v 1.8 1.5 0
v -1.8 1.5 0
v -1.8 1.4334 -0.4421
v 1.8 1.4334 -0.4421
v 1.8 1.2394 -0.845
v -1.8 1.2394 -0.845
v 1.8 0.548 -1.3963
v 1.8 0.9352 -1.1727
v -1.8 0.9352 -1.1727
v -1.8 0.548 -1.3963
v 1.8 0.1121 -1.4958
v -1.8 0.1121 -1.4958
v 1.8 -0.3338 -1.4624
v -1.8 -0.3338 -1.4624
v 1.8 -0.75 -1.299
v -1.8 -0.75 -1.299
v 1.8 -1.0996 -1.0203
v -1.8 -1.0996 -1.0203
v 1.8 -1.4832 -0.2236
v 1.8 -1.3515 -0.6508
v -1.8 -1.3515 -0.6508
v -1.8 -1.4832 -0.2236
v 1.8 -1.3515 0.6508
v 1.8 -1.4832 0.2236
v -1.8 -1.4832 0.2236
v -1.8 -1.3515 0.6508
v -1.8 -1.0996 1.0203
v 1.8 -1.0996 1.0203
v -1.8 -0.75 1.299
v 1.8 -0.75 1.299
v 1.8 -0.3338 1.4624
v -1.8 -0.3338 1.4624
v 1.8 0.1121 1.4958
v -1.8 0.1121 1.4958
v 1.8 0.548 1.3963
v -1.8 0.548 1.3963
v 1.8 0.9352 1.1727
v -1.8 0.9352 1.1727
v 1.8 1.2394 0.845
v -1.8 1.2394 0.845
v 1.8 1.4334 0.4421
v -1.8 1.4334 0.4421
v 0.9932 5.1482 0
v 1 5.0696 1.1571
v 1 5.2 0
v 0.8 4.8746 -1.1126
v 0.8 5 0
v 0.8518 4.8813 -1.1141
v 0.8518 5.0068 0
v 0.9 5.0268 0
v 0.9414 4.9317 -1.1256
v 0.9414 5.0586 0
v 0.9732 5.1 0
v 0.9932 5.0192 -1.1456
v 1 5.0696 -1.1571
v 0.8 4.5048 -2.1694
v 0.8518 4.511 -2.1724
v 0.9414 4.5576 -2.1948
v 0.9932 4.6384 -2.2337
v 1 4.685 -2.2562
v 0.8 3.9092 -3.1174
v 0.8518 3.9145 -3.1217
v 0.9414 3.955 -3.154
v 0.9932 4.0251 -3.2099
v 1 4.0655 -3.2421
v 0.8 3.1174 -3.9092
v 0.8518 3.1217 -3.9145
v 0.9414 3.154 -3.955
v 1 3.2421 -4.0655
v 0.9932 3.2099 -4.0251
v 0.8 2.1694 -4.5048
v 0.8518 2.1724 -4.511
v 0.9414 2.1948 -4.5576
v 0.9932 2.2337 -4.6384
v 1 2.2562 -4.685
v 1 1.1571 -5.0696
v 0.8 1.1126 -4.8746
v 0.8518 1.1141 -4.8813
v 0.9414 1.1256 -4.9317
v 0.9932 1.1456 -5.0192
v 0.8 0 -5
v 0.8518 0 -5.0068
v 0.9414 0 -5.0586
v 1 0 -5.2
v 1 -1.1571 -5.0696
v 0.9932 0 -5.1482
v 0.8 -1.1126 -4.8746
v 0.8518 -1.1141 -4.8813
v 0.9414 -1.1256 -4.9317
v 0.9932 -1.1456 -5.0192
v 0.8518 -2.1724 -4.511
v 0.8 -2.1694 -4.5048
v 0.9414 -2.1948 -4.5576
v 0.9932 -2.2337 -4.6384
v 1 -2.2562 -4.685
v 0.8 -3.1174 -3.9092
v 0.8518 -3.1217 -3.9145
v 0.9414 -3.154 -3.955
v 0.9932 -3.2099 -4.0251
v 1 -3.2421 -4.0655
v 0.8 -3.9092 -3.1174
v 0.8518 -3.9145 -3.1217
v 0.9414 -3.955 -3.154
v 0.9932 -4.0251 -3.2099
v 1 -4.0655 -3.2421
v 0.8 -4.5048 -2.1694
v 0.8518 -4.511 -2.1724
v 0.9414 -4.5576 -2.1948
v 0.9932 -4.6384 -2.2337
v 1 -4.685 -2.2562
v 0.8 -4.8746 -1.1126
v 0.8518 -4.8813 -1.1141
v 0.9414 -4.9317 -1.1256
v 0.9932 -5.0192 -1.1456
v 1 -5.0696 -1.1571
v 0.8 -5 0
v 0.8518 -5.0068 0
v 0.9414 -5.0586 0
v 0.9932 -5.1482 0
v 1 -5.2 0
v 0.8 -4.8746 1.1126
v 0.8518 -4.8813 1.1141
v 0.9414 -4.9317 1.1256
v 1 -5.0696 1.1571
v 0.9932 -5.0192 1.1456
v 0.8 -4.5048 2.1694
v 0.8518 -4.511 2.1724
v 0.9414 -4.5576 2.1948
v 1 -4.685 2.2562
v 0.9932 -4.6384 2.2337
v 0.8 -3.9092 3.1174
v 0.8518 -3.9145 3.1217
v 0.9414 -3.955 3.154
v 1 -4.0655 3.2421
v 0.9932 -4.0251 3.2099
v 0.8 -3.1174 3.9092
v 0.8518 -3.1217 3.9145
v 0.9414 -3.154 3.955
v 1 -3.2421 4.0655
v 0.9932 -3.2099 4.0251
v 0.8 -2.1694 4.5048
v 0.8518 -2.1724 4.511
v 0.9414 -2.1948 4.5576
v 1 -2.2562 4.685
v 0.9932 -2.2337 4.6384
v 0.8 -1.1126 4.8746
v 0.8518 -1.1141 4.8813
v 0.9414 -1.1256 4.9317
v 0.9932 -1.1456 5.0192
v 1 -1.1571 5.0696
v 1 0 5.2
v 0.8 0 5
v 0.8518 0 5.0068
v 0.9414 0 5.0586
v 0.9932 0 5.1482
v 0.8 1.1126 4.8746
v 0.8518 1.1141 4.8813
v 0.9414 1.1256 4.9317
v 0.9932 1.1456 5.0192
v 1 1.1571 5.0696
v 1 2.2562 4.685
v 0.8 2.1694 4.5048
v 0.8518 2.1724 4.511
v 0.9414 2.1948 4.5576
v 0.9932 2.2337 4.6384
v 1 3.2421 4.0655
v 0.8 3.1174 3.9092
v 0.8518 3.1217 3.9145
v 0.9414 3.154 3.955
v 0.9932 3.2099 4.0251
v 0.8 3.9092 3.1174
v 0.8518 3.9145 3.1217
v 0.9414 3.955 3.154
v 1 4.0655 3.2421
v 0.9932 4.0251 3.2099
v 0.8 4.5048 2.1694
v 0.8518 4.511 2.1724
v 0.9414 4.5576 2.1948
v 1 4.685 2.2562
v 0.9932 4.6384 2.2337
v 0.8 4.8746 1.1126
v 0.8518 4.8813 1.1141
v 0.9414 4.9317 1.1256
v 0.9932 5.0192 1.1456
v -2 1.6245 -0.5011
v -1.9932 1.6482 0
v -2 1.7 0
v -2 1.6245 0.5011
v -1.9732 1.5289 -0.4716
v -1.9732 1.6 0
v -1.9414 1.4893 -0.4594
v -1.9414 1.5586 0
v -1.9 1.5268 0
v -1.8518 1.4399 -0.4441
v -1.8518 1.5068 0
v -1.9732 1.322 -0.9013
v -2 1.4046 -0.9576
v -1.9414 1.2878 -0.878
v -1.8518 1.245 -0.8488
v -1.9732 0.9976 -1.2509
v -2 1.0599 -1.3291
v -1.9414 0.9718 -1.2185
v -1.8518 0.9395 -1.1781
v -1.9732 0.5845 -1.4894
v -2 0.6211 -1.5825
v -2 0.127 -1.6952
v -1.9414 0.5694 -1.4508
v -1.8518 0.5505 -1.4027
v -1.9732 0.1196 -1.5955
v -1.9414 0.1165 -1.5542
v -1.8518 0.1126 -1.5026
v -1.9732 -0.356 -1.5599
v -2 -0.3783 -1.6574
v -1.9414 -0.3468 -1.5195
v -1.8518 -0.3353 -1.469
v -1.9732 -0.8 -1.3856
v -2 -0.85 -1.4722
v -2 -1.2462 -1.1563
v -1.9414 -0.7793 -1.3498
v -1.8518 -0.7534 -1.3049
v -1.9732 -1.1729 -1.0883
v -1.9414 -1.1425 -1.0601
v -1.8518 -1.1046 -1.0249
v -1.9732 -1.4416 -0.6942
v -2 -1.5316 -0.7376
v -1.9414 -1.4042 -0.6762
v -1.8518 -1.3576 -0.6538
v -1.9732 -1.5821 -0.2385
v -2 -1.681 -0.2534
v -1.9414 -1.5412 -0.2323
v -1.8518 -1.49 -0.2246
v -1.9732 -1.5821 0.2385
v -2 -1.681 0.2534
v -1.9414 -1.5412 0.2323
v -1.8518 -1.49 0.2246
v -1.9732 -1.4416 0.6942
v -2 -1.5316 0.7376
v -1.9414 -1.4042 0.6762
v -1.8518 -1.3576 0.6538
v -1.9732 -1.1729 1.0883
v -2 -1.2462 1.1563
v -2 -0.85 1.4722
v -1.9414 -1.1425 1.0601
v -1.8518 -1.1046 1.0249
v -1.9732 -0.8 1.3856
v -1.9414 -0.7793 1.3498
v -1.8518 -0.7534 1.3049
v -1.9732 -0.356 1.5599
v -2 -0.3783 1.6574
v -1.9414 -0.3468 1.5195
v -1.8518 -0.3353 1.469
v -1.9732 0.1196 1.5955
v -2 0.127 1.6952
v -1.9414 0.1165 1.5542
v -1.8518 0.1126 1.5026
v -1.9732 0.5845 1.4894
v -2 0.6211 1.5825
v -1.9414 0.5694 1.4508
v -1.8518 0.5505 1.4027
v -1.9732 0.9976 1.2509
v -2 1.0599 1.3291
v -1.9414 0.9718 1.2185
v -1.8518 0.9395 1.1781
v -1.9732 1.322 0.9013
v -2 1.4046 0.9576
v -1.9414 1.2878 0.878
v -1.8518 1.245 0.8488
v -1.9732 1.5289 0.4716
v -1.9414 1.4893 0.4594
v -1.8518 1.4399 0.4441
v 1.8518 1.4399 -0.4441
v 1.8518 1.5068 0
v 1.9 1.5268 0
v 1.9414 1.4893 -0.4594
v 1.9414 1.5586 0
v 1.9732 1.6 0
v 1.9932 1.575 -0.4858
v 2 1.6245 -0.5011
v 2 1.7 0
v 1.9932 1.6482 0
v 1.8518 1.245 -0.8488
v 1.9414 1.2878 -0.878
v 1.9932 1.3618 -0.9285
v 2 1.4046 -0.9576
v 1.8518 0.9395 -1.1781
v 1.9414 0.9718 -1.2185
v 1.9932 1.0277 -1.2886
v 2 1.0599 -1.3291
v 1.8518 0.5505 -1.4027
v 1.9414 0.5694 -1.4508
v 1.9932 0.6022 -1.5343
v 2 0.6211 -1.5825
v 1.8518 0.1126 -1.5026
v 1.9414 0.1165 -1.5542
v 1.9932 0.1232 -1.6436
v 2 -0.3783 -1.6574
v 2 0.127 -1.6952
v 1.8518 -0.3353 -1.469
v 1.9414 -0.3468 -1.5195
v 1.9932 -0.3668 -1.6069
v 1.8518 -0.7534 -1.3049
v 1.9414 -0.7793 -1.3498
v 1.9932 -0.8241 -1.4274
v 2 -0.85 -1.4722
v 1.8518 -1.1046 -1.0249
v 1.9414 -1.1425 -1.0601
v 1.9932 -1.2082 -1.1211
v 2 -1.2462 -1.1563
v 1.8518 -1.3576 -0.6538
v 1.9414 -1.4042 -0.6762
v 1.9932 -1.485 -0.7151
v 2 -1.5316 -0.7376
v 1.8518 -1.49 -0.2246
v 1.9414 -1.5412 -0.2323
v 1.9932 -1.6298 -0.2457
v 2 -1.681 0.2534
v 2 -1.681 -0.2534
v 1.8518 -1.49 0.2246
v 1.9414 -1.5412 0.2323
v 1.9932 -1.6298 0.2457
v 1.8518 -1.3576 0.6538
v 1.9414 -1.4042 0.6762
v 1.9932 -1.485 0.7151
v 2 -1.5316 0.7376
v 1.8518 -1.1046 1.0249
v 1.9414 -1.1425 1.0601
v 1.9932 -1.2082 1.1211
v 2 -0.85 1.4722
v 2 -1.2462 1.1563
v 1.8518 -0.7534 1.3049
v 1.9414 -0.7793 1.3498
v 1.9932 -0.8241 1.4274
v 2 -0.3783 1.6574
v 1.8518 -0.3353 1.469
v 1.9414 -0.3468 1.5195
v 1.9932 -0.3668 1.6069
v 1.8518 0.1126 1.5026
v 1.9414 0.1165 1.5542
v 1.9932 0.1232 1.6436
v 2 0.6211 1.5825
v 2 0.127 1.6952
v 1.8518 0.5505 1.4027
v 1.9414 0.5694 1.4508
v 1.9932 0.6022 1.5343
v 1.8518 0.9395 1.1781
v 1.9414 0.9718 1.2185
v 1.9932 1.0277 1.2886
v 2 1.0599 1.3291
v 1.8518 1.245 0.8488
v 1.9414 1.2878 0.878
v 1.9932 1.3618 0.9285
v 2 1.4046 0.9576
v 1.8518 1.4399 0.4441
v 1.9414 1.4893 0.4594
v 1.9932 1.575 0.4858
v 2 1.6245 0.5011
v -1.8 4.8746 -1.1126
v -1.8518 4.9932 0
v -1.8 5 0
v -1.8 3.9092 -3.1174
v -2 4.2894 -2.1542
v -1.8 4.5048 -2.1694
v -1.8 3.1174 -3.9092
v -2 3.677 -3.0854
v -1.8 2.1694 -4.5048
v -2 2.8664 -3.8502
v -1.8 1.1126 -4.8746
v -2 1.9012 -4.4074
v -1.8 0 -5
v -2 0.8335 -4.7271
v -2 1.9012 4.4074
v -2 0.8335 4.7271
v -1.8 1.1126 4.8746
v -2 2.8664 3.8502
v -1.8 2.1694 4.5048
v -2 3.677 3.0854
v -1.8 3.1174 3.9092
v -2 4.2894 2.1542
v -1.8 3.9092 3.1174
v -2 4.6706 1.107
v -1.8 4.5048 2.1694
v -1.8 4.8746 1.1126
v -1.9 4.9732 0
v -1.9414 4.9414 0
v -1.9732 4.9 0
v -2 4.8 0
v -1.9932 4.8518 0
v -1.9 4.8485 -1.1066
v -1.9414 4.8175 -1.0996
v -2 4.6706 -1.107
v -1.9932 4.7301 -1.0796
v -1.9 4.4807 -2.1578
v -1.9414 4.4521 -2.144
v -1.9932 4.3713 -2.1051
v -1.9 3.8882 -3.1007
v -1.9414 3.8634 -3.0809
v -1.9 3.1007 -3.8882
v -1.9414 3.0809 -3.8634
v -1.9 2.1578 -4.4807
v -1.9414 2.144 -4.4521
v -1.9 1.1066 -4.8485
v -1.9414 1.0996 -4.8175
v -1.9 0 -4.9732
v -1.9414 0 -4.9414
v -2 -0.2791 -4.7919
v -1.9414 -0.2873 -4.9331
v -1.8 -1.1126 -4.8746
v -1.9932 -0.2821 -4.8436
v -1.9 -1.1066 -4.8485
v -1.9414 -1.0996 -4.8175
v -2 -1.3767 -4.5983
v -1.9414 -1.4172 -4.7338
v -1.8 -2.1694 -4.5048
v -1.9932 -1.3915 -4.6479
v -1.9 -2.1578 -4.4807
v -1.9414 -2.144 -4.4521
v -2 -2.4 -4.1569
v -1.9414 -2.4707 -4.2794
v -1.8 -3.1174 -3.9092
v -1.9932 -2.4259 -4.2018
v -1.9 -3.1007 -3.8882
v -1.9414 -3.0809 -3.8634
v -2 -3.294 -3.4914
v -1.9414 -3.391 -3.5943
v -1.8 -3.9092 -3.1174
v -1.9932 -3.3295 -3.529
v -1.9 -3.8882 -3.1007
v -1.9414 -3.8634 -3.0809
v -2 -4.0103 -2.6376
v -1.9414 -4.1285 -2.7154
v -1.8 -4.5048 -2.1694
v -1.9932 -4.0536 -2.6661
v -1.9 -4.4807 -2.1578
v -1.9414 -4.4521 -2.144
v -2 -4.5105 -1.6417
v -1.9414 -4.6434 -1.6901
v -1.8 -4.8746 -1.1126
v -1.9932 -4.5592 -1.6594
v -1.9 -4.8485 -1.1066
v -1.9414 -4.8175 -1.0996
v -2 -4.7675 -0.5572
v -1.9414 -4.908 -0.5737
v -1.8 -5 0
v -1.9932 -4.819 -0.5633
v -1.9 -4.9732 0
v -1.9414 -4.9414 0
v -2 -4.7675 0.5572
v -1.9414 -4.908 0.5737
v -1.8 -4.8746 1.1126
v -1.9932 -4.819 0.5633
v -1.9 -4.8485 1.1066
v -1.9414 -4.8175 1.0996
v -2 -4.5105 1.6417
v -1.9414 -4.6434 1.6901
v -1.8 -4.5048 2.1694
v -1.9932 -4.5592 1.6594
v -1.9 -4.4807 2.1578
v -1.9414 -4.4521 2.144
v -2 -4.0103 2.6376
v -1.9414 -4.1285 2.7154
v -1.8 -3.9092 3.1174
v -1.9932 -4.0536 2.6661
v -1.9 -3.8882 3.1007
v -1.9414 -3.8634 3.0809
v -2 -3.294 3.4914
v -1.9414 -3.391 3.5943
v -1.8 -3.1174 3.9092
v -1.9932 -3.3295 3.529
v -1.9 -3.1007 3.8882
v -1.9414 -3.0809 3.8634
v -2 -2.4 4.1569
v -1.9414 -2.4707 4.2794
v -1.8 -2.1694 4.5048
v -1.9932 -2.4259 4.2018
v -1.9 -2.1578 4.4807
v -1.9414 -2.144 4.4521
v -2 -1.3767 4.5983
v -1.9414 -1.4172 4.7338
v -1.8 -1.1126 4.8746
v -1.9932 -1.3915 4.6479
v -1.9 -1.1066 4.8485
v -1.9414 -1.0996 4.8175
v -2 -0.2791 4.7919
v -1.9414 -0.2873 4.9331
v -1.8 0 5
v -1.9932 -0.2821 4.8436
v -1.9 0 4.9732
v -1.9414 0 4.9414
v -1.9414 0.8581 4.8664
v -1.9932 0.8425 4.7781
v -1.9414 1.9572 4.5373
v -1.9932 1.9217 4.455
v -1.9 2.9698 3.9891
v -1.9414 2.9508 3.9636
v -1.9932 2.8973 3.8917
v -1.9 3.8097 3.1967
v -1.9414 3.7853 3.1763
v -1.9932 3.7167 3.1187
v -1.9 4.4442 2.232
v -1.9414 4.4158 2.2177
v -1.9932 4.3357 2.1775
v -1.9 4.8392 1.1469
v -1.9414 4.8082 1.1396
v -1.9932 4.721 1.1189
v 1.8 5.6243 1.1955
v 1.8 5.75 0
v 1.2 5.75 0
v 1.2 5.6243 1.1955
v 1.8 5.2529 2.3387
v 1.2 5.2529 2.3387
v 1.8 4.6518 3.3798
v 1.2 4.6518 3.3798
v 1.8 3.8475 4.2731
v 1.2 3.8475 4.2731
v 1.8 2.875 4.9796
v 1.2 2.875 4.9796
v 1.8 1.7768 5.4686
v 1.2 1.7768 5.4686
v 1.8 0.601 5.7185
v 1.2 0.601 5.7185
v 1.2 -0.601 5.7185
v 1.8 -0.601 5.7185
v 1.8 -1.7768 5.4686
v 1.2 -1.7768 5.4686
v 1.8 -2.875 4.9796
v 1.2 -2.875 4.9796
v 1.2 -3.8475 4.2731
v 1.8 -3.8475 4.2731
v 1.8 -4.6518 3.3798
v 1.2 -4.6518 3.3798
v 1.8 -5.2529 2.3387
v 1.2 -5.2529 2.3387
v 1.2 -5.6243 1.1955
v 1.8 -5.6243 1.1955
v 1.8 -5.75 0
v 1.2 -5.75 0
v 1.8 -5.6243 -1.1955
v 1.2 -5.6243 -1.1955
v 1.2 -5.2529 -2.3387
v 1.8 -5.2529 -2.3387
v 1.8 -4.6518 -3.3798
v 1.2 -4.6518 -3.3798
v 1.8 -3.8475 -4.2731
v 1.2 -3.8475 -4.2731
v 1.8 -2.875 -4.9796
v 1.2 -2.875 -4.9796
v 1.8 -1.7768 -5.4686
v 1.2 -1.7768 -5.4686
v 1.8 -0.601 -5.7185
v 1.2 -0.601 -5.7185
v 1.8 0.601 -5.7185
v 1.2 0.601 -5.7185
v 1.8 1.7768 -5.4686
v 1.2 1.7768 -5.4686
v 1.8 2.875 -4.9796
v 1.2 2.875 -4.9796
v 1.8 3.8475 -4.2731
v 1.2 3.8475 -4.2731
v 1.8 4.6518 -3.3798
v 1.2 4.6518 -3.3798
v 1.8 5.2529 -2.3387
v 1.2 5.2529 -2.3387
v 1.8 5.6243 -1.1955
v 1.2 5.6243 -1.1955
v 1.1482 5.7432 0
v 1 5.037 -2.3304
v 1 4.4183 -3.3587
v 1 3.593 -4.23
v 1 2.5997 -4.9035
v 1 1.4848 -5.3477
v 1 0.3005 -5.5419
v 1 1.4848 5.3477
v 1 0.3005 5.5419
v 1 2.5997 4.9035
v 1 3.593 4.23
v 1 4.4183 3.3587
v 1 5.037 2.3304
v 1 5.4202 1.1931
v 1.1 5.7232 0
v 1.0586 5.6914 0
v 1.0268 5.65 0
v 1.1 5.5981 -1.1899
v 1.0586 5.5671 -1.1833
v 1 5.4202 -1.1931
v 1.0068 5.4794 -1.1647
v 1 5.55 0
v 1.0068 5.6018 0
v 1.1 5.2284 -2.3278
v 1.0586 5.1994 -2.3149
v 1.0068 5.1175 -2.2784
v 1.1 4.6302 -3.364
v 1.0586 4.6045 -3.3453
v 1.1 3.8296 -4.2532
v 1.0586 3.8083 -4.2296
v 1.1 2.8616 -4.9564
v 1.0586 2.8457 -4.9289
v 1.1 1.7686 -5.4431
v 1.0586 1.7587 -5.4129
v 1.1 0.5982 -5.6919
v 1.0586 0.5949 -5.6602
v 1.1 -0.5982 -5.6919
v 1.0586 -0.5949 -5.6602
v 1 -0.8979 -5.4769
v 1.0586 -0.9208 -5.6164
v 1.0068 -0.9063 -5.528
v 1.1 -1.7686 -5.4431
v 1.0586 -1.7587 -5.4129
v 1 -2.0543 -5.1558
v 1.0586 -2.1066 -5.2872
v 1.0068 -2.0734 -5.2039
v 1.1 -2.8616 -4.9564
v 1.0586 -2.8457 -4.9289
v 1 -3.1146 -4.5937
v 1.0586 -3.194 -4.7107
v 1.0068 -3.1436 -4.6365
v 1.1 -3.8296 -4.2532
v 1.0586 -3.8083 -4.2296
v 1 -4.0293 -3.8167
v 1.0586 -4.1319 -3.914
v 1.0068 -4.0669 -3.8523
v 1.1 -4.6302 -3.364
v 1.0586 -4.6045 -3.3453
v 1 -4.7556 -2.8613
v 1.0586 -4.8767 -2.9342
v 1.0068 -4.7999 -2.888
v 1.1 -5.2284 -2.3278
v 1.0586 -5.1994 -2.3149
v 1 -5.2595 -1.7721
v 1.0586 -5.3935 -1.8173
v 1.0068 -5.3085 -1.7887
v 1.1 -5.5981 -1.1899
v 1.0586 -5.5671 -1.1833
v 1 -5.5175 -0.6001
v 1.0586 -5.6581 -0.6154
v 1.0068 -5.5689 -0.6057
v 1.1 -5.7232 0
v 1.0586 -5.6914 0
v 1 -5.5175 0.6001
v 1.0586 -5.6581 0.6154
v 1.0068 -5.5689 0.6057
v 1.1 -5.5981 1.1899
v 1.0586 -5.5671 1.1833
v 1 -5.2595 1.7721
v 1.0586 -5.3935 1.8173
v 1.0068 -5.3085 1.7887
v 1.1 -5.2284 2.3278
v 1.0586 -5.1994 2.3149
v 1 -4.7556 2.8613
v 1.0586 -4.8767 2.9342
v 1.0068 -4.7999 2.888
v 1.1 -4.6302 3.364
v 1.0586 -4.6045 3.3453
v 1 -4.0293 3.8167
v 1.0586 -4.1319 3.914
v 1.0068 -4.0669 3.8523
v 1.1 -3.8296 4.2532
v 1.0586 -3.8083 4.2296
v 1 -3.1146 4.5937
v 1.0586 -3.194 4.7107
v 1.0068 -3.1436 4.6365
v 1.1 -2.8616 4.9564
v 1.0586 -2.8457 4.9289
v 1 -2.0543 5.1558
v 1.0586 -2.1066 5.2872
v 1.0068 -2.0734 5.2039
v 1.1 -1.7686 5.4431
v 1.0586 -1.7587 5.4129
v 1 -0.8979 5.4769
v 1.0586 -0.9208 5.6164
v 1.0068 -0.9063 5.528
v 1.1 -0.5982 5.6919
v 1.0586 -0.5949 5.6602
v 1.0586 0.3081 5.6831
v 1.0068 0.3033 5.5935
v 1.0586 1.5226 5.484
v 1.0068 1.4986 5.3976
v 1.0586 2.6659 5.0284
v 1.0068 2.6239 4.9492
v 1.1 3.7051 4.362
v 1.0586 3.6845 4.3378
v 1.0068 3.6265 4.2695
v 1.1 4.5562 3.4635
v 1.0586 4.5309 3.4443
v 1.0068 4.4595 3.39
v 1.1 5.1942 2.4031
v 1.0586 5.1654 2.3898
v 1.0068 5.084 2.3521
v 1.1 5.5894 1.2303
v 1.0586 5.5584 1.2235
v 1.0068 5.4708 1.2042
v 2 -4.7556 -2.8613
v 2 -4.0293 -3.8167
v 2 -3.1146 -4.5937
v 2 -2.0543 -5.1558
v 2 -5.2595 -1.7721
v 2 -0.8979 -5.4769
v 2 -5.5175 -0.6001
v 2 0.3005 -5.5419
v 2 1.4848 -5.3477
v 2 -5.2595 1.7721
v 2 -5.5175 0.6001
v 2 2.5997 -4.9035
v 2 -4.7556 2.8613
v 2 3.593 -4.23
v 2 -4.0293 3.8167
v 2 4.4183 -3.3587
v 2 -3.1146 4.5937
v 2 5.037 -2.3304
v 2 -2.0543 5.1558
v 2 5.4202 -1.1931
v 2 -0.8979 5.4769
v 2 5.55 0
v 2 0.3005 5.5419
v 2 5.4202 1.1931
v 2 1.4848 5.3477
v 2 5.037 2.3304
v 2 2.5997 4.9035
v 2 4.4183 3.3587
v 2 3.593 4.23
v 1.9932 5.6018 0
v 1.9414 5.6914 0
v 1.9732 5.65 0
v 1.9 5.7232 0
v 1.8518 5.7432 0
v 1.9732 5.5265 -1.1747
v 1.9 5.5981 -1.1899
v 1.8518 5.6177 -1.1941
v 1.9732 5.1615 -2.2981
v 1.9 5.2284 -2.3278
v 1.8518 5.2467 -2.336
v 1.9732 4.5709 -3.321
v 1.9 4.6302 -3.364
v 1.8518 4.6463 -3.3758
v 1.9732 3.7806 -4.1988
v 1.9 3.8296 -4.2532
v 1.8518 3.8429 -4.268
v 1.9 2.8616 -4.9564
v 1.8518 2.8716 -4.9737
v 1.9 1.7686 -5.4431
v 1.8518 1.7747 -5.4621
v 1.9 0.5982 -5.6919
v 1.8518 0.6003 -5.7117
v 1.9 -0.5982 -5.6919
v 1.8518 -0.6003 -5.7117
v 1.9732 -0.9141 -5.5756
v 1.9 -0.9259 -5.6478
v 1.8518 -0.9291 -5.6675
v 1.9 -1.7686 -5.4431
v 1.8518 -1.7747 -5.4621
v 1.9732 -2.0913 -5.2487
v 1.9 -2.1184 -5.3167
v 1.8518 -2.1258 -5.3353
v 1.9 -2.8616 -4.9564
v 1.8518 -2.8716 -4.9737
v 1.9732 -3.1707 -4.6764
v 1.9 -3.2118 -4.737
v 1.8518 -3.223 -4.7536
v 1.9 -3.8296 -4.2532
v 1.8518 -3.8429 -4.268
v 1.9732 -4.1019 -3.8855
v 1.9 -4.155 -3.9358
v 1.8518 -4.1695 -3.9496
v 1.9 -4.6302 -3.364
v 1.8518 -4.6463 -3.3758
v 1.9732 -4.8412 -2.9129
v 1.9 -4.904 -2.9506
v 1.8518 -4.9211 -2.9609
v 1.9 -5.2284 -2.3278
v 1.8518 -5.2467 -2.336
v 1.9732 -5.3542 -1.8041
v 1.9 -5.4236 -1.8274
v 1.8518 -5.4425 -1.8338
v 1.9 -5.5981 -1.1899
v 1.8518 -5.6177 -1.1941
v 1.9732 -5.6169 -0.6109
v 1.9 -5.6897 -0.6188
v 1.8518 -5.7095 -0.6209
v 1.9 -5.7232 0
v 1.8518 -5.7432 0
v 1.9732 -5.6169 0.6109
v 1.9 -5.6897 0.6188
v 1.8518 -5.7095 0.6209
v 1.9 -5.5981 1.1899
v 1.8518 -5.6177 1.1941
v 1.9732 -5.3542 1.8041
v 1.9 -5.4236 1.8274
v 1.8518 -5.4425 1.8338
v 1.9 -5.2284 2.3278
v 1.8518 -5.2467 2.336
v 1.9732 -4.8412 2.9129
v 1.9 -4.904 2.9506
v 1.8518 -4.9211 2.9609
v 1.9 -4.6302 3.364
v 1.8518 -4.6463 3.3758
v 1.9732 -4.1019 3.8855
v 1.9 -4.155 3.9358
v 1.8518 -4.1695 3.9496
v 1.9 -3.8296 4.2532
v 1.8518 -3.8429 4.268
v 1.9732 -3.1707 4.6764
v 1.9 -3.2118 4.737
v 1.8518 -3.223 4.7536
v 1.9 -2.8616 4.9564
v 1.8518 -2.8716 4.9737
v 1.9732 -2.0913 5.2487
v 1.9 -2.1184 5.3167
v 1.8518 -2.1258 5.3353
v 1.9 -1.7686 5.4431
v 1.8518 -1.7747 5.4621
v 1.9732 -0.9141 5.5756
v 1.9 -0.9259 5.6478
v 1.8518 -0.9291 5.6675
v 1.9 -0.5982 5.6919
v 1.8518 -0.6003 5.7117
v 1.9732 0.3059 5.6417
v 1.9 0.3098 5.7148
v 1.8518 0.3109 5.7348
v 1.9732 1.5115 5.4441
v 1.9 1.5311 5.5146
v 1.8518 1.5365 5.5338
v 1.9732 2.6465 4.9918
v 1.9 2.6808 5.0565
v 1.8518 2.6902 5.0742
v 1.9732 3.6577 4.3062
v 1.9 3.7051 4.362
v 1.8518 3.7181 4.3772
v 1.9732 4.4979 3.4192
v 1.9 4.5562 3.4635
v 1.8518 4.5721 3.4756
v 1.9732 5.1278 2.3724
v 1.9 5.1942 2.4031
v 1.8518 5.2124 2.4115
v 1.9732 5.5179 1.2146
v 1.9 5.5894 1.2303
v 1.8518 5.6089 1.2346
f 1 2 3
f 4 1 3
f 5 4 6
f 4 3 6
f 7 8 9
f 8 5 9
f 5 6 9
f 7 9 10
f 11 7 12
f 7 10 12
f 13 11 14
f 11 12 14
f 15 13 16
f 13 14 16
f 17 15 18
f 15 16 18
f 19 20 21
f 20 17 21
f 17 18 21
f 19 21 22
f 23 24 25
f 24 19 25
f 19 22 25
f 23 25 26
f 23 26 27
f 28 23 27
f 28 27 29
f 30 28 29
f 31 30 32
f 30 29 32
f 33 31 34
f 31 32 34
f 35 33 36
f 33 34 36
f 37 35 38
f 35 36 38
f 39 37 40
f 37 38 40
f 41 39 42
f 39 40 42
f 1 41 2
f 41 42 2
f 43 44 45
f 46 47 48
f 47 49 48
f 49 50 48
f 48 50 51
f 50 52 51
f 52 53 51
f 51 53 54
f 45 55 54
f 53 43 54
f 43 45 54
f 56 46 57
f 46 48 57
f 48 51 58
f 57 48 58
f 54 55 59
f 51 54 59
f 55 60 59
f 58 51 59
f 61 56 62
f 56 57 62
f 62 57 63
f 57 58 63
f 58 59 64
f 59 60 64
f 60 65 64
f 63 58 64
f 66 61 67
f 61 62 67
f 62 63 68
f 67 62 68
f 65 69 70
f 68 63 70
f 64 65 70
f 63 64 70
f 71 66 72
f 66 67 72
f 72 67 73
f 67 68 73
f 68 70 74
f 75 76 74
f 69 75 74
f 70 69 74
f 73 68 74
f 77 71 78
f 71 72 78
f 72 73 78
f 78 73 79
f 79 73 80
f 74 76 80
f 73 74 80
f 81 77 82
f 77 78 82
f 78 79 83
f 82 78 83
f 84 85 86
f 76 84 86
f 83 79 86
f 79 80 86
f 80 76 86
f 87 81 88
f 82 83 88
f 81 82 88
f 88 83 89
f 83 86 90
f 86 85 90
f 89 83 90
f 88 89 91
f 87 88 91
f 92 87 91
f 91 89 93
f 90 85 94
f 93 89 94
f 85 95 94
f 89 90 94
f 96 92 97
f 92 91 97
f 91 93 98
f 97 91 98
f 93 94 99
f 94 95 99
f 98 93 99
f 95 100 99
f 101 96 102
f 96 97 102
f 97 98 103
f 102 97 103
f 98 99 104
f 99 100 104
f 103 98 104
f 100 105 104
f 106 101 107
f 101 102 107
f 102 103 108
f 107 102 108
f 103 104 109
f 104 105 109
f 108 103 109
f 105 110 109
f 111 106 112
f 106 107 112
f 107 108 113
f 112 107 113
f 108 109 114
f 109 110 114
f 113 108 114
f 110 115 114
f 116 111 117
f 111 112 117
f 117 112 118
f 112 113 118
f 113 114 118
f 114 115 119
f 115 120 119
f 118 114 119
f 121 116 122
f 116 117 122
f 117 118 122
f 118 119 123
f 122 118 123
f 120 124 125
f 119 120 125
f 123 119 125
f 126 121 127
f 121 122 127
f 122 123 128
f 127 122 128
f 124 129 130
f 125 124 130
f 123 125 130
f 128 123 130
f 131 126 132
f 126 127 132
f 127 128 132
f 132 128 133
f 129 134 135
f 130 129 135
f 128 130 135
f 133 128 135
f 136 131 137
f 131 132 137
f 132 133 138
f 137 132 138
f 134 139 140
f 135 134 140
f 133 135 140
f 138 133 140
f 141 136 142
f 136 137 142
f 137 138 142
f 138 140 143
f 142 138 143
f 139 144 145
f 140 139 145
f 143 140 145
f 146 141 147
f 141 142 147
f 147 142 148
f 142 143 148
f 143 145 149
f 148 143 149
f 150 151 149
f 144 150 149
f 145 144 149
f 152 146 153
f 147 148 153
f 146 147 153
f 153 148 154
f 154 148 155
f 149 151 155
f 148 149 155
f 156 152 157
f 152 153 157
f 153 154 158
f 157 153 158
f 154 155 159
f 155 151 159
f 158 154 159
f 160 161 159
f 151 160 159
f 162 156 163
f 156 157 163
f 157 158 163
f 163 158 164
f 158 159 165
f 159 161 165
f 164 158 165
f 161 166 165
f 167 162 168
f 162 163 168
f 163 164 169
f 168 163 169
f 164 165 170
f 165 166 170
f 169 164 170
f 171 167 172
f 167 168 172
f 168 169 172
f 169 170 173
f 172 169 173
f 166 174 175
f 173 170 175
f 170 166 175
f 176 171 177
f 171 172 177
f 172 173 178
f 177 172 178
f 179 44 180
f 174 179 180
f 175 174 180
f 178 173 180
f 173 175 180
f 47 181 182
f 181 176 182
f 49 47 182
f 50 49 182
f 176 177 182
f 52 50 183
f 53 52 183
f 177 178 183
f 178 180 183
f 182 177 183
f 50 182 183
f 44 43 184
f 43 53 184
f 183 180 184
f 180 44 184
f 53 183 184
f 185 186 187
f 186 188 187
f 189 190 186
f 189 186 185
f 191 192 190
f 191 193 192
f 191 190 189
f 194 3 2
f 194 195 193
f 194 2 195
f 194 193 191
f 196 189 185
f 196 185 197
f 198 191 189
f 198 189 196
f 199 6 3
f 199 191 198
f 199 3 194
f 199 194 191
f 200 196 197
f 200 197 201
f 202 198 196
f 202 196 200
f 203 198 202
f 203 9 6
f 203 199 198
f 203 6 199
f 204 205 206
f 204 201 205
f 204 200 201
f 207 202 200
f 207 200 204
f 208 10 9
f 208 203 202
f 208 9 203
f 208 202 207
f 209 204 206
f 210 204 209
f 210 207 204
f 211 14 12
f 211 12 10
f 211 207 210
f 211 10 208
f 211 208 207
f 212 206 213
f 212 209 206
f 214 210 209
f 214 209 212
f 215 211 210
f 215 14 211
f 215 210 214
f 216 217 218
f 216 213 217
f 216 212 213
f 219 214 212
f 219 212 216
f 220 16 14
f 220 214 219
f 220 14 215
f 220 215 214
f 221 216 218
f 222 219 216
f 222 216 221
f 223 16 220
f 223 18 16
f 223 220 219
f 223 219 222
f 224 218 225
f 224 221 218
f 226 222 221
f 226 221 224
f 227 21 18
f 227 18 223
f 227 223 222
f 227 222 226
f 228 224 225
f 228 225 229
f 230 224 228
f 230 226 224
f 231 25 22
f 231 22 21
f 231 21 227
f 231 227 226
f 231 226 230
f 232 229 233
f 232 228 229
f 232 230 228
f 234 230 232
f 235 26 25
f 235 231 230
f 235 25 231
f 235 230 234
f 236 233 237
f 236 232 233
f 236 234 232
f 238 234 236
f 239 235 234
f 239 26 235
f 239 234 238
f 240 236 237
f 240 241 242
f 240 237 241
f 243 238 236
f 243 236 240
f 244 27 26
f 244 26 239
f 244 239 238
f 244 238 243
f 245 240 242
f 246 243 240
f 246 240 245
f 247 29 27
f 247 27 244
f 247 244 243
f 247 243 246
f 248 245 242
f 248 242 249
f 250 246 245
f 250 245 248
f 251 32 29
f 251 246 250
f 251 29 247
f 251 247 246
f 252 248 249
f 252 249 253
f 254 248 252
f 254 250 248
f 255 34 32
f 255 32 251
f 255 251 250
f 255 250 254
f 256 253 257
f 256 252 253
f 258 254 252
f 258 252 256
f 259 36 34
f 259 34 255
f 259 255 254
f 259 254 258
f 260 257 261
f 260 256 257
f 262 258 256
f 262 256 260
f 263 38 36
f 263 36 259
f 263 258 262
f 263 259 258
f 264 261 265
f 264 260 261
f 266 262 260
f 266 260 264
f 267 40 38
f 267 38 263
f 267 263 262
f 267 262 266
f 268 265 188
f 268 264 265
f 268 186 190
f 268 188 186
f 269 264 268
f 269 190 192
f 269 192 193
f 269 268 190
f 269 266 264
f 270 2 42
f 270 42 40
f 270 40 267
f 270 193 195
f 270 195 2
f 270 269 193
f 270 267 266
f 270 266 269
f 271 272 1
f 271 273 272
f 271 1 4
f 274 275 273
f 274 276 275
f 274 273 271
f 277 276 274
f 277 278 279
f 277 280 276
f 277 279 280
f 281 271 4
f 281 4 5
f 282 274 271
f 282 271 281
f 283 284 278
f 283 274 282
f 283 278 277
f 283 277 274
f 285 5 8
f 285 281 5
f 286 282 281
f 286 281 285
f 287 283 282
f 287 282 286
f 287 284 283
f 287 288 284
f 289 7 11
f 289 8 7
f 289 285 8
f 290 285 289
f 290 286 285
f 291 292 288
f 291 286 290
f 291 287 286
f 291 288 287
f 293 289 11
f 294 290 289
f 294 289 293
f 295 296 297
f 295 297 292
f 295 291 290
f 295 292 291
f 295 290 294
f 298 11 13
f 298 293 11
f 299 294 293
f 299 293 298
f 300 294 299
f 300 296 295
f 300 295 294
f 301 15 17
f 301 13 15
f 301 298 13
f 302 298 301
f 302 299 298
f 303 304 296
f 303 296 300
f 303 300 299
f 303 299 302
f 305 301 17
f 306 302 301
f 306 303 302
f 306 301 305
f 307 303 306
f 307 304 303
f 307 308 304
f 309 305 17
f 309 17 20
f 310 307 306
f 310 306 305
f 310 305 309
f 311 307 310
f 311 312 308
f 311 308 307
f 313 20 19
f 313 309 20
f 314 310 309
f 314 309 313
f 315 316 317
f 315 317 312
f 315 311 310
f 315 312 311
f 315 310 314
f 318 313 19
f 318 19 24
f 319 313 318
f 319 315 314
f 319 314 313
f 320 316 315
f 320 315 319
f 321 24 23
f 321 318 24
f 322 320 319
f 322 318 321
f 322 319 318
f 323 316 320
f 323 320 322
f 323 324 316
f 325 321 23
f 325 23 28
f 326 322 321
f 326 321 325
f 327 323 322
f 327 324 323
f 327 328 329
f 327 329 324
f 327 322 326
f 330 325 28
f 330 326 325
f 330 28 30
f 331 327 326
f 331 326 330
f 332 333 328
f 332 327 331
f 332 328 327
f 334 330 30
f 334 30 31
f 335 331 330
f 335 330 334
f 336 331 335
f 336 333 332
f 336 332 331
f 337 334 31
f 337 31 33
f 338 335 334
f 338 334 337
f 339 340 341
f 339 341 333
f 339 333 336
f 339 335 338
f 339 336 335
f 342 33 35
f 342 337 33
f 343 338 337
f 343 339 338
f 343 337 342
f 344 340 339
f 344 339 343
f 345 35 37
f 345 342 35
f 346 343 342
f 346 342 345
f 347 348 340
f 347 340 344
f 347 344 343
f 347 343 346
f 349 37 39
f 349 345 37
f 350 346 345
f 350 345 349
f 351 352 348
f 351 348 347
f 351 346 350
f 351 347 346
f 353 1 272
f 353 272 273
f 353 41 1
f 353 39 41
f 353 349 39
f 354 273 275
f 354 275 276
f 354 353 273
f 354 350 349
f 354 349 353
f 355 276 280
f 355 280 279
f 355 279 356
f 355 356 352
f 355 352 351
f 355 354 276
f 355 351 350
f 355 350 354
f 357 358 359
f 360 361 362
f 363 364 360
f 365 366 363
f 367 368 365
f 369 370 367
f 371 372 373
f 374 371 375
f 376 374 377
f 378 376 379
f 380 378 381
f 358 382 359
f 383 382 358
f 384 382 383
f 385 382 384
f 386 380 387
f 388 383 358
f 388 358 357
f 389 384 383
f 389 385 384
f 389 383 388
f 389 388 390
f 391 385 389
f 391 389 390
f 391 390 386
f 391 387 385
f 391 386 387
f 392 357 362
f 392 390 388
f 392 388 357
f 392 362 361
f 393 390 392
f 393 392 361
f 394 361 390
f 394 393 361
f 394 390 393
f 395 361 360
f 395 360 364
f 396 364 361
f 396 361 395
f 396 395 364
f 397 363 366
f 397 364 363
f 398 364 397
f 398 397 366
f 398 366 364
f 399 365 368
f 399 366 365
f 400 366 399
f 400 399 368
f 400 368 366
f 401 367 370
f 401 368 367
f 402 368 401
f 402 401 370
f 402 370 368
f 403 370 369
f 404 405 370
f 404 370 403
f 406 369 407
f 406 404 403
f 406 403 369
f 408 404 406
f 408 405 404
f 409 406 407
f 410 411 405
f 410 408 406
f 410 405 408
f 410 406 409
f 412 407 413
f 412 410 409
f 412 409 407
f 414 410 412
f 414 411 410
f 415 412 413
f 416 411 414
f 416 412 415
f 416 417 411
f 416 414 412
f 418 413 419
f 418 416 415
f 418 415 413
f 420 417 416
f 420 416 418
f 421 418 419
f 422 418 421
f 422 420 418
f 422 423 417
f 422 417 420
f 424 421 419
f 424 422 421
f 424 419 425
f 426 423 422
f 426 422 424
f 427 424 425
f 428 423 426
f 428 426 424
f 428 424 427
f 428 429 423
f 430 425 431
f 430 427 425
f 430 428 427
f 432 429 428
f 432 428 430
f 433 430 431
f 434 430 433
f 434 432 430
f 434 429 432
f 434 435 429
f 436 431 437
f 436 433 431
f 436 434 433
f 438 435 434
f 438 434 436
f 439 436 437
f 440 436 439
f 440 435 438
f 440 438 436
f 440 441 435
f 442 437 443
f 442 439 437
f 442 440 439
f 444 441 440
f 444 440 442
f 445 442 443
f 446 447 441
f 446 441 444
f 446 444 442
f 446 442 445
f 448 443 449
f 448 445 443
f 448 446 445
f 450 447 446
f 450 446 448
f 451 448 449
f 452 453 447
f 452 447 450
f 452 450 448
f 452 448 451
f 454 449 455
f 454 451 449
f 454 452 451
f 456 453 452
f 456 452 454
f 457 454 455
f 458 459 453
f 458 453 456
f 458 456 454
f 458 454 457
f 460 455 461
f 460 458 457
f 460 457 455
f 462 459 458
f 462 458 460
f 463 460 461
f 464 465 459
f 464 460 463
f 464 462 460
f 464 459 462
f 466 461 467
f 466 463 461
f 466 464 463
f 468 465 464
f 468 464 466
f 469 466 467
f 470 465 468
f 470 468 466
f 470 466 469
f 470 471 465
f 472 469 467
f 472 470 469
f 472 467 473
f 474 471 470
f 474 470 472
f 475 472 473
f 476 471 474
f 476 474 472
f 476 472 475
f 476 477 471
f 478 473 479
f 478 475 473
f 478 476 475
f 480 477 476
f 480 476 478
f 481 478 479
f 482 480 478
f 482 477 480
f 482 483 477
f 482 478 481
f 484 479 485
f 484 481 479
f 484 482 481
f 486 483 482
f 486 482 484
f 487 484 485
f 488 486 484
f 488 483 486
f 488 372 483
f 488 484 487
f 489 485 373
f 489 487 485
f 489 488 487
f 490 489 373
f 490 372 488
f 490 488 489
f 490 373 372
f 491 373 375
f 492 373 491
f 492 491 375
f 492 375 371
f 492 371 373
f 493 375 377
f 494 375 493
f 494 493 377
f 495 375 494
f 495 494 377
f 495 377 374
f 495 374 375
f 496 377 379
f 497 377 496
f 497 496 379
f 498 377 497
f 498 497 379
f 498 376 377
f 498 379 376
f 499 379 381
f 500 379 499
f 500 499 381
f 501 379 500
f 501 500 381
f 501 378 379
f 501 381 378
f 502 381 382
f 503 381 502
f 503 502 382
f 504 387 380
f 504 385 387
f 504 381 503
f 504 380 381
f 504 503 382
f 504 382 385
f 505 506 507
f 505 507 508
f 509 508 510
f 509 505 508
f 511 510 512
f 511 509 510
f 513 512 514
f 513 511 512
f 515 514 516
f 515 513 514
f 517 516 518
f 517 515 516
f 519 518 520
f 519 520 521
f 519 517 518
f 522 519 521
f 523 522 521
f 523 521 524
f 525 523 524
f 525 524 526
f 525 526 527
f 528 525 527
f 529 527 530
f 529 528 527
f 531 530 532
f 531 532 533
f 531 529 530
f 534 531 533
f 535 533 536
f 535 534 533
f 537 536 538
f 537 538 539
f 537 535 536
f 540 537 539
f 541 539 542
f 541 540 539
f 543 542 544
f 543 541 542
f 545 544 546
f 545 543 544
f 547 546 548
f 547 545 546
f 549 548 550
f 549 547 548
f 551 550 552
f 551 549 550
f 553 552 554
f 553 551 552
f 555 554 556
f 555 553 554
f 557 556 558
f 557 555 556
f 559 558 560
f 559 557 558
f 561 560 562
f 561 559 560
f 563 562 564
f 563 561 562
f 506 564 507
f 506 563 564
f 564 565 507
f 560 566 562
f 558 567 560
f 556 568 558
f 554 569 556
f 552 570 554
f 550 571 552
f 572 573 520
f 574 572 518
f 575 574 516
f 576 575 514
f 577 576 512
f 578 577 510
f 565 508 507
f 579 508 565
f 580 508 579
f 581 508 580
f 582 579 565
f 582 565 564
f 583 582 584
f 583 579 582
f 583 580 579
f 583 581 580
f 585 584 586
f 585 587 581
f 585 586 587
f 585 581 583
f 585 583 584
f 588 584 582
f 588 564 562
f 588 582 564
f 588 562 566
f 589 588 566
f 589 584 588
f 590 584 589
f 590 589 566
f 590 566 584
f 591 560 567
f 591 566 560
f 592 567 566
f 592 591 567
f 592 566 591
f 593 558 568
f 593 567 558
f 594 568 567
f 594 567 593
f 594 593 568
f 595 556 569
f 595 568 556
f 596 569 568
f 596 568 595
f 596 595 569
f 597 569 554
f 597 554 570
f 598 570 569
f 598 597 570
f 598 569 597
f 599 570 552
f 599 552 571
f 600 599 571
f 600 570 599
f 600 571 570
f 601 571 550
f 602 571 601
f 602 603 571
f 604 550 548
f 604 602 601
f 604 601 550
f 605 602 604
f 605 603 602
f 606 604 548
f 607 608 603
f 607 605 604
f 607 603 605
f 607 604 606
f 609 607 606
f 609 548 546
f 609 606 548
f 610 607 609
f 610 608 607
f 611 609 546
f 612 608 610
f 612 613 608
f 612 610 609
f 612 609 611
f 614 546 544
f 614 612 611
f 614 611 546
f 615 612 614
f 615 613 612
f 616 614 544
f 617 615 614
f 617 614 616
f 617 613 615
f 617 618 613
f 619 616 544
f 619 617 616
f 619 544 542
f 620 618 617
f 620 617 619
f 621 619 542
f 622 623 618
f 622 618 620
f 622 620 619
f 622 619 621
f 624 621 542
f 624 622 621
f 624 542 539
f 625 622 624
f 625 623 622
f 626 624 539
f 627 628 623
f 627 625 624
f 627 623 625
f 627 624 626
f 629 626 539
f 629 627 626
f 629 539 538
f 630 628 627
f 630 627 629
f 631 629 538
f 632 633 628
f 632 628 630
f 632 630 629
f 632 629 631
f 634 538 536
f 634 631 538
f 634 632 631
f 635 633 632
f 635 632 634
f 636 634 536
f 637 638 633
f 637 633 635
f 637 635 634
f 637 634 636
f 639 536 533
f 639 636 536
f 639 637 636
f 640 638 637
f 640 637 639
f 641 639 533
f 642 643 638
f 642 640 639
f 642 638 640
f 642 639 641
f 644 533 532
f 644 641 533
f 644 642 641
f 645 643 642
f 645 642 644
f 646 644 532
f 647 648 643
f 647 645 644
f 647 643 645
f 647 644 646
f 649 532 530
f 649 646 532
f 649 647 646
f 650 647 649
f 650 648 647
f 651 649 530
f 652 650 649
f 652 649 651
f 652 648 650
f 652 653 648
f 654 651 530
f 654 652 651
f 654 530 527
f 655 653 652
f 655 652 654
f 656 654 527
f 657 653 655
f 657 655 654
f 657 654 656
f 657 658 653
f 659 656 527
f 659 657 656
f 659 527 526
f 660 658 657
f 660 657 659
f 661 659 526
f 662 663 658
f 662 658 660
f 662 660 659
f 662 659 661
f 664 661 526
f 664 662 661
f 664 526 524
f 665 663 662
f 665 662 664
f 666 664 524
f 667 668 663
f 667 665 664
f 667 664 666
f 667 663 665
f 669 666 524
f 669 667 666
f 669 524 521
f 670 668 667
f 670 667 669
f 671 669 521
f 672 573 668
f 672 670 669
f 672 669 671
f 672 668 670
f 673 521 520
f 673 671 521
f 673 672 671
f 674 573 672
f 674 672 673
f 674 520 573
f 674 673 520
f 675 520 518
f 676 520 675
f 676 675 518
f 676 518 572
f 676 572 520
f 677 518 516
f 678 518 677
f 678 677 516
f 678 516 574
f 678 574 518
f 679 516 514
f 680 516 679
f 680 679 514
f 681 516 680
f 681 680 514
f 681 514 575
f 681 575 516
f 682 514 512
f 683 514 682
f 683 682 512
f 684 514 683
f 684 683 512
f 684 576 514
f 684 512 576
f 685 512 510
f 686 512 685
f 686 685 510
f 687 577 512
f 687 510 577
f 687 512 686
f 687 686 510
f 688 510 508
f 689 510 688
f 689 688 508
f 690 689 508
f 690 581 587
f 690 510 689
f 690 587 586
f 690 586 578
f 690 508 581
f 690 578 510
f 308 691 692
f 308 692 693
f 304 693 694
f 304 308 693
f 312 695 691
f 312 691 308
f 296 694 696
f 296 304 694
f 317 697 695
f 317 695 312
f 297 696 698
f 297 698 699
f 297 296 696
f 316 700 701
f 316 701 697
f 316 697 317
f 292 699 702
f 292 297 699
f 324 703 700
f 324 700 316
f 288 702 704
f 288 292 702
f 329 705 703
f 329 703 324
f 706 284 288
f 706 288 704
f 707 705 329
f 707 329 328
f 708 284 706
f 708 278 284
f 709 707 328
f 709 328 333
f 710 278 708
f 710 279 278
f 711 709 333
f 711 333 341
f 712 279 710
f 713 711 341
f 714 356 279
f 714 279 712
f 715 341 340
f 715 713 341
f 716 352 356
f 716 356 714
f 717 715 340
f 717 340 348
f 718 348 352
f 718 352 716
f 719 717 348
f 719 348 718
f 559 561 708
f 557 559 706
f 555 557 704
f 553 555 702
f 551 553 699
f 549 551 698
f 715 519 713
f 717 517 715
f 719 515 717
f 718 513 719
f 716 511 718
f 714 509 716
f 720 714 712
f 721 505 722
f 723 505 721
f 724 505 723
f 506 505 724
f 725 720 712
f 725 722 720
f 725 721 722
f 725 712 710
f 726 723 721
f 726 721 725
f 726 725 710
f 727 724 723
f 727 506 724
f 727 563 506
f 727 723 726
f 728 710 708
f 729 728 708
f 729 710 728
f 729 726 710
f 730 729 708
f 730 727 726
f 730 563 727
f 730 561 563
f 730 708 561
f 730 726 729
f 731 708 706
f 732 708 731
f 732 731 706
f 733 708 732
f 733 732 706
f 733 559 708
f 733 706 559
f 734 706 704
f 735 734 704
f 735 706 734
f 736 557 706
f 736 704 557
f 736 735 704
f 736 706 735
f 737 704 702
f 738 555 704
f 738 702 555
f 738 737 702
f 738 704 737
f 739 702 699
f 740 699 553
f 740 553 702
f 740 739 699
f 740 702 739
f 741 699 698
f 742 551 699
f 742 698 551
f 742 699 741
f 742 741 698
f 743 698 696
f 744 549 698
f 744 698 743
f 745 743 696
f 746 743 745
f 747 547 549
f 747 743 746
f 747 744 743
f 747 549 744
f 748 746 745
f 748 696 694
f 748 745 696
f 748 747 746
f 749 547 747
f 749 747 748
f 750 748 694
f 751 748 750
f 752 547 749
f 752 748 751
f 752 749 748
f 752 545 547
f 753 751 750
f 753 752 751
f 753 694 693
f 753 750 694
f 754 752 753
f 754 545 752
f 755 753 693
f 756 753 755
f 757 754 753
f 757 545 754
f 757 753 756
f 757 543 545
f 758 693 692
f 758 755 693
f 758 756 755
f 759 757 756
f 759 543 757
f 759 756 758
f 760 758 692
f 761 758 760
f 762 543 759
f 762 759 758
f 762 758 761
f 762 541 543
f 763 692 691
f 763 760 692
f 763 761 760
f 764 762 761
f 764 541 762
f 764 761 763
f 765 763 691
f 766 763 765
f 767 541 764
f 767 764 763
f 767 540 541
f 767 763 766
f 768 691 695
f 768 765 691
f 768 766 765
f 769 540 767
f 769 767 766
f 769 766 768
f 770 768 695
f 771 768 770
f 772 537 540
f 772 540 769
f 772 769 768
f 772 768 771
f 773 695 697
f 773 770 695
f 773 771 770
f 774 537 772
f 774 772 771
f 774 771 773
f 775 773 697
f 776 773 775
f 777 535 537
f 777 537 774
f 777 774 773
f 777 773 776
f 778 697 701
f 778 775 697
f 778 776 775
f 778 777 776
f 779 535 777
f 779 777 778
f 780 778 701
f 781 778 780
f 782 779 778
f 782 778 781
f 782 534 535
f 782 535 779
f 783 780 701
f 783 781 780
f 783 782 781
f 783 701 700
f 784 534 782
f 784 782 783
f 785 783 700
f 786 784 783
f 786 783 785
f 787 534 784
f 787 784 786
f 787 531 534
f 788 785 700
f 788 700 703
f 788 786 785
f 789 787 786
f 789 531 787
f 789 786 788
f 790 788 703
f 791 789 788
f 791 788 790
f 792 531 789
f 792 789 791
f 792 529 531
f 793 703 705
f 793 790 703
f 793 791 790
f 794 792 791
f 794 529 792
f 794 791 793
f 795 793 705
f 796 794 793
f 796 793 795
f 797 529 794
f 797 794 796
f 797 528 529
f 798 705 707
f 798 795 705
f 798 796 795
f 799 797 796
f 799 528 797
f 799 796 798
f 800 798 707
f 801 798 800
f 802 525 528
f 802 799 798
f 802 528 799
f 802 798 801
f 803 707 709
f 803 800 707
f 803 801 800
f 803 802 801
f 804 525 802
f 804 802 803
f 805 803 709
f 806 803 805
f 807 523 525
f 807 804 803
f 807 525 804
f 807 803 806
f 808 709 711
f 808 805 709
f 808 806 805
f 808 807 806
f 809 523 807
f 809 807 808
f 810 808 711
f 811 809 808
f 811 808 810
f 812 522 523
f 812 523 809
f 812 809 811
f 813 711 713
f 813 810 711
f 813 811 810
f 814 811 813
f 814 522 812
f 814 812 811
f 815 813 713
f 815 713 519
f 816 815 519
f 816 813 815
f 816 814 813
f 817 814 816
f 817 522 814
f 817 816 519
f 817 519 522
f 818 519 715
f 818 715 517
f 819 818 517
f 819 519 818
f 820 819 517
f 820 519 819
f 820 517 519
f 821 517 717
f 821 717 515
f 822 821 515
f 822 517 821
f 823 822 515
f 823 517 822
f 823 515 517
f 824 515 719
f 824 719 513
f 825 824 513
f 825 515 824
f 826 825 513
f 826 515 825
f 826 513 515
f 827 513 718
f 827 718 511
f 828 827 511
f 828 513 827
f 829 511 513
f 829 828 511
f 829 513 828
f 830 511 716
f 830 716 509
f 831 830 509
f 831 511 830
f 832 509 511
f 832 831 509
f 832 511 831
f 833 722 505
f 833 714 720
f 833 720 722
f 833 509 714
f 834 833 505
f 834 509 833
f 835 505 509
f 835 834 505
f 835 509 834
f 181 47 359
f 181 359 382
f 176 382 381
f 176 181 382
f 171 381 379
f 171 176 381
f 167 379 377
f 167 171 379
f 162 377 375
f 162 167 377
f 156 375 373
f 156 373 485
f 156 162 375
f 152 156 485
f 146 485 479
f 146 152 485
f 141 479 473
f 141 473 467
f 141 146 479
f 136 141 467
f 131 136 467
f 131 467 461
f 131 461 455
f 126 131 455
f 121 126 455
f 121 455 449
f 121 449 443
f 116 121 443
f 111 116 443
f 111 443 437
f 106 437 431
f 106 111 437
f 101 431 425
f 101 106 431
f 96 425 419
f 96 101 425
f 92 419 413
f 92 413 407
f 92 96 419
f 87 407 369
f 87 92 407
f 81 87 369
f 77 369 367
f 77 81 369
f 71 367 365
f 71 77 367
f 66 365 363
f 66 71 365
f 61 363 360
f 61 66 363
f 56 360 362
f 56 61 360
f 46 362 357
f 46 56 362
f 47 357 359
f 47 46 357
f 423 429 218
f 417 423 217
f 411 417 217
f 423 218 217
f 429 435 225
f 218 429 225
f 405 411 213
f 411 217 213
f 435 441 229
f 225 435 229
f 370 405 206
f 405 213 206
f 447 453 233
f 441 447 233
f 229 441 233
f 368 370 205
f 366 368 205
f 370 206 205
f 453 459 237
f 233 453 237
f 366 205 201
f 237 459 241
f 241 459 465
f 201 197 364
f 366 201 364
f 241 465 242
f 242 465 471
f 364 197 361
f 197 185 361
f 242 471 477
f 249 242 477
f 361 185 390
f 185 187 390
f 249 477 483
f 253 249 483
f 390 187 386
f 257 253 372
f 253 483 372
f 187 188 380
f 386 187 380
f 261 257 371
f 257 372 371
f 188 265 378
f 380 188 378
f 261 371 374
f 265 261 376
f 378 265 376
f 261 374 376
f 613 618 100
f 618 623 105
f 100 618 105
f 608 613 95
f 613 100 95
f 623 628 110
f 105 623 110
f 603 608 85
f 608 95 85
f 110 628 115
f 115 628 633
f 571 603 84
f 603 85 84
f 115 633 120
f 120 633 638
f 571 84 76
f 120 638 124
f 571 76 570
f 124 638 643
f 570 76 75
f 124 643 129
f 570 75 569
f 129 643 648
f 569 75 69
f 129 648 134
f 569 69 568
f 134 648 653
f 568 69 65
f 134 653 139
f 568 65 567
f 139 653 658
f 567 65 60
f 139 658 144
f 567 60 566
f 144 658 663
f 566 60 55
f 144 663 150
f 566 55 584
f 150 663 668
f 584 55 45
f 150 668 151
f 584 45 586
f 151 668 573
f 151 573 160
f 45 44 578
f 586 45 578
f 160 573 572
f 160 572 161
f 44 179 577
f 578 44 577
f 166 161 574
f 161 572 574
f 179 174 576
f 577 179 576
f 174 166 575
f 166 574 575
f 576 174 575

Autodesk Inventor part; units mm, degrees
ref_plane "YZ Plane" through (0, 0, 0) normal (1, 0, 0) x (0, 1, 0)
ref_plane "XZ Plane" through (0, 0, 0) normal (0, 1, 0) x (-1, 0, 0)
ref_plane "XY Plane" through (0, 0, 0) normal (0, 0, 1) x (1, 0, 0)
sketch "Esquisse1" plane through (0, 0, 0) normal (0, 0, 1) x (1, 0, 0)
  line L0 (-4.4077, 0) -> (0, 0)
  line L1 (1.8, 1.5) -> (-1.8, 1.5)
  line L2 (-2, 1.7) -> (-2, 4.8)
  line L3 (-1.8, 5) -> (0.8, 5)
  line L4 (1, 5.2) -> (1, 5.55)
  line L5 (1.2, 5.75) -> (1.8, 5.75)
  line L6 (2, 5.55) -> (2, 1.7)
  arc A0 (-1.8, 5) -> (-2, 4.8) centre (-1.8, 4.8) ccw
  arc A1 (-2, 1.7) -> (-1.8, 1.5) centre (-1.8, 1.7) ccw
  arc A2 (1.8, 1.5) -> (2, 1.7) centre (1.8, 1.7) ccw
  arc A3 (2, 5.55) -> (1.8, 5.75) centre (1.8, 5.55) ccw
  arc A4 (1.2, 5.75) -> (1, 5.55) centre (1.2, 5.55) ccw
  arc A5 (0.8, 5) -> (1, 5.2) centre (0.8, 5.2) ccw
  point P0 (1, 5.75)
  point P1 (2, 5.75)
  dimension "d0" = 3
  dimension "d1" = 4
  dimension "d2" = 11.5
  dimension "d3" = 10
  dimension "d4" = 1
  dimension "d5" = 2
  dimension "d6" = 0.2
revolve "Révolution1" add sketch "Esquisse1" angle 360 about axis through (-4.4077, 0, 0) along (1, 0, 0)
equation "\"d5\" = 0.5 * d1"
properties part number "Roulement a bille F623ZZ" material "----------"
